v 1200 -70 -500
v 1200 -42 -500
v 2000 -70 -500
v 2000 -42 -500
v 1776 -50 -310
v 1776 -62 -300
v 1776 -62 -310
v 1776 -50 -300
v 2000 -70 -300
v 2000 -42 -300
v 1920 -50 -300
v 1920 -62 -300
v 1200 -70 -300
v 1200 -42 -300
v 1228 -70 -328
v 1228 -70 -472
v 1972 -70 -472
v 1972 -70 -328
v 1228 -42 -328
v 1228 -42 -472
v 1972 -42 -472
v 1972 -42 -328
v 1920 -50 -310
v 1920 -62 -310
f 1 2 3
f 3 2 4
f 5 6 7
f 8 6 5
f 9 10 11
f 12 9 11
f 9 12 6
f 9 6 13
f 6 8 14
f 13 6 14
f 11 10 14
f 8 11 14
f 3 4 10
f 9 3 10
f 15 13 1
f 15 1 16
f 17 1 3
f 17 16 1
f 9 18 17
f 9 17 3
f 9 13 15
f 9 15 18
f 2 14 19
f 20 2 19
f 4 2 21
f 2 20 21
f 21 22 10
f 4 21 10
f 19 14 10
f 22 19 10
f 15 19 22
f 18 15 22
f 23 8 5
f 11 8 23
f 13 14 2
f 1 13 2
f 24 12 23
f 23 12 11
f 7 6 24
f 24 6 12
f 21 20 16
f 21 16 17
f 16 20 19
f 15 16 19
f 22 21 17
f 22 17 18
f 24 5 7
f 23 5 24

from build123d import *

# Parameters (mm, degrees)
F0_W          = 70
F0_H          = 70
F0_W_2        = 1860
F0_H_2        = 360
F1_DEPTH      = 70
F2_W          = 360
F2_H          = 30
F3_DEPTH      = 25
F3_DEPTH_BACK = 25
F4_SCALE      = 0.4


with BuildPart() as f1:
    # F0 (on Front) → F1 (new body)
    with BuildSketch(Plane.XZ):
        with Locations((35, -35)):
            Rectangle(F0_W, F0_H)
        with Locations((1000, -35)):
            Rectangle(F0_W_2, F0_H)
        with Locations((35, -250)):
            Rectangle(F0_W, F0_H_2)
        with Locations((1965, -35)):
            Rectangle(F0_W, F0_H)
        with Locations((35, -465)):
            Rectangle(F0_W, F0_H)
        with Locations((1965, -250)):
            Rectangle(F0_W, F0_H_2)
        with Locations((1000, -465)):
            Rectangle(F0_W_2, F0_H)
        with Locations((1965, -465)):
            Rectangle(F0_W, F0_H)
    extrude(amount=F1_DEPTH)

    # F2 (on face) → F3 (cut, two sides)
    with BuildSketch(Plane.XY) as f3_sk:
        with Locations((1620, -35)):
            Rectangle(F2_W, F2_H)
    extrude(amount=F3_DEPTH, mode=Mode.SUBTRACT)
    extrude(f3_sk.sketch, amount=-F3_DEPTH_BACK, mode=Mode.SUBTRACT)


with BuildPart() as f1_1:
    # F4: moved
    add(f1.part.scale(F4_SCALE).moved(Location((1200, -42, -300))))


solid = f1_1.part
